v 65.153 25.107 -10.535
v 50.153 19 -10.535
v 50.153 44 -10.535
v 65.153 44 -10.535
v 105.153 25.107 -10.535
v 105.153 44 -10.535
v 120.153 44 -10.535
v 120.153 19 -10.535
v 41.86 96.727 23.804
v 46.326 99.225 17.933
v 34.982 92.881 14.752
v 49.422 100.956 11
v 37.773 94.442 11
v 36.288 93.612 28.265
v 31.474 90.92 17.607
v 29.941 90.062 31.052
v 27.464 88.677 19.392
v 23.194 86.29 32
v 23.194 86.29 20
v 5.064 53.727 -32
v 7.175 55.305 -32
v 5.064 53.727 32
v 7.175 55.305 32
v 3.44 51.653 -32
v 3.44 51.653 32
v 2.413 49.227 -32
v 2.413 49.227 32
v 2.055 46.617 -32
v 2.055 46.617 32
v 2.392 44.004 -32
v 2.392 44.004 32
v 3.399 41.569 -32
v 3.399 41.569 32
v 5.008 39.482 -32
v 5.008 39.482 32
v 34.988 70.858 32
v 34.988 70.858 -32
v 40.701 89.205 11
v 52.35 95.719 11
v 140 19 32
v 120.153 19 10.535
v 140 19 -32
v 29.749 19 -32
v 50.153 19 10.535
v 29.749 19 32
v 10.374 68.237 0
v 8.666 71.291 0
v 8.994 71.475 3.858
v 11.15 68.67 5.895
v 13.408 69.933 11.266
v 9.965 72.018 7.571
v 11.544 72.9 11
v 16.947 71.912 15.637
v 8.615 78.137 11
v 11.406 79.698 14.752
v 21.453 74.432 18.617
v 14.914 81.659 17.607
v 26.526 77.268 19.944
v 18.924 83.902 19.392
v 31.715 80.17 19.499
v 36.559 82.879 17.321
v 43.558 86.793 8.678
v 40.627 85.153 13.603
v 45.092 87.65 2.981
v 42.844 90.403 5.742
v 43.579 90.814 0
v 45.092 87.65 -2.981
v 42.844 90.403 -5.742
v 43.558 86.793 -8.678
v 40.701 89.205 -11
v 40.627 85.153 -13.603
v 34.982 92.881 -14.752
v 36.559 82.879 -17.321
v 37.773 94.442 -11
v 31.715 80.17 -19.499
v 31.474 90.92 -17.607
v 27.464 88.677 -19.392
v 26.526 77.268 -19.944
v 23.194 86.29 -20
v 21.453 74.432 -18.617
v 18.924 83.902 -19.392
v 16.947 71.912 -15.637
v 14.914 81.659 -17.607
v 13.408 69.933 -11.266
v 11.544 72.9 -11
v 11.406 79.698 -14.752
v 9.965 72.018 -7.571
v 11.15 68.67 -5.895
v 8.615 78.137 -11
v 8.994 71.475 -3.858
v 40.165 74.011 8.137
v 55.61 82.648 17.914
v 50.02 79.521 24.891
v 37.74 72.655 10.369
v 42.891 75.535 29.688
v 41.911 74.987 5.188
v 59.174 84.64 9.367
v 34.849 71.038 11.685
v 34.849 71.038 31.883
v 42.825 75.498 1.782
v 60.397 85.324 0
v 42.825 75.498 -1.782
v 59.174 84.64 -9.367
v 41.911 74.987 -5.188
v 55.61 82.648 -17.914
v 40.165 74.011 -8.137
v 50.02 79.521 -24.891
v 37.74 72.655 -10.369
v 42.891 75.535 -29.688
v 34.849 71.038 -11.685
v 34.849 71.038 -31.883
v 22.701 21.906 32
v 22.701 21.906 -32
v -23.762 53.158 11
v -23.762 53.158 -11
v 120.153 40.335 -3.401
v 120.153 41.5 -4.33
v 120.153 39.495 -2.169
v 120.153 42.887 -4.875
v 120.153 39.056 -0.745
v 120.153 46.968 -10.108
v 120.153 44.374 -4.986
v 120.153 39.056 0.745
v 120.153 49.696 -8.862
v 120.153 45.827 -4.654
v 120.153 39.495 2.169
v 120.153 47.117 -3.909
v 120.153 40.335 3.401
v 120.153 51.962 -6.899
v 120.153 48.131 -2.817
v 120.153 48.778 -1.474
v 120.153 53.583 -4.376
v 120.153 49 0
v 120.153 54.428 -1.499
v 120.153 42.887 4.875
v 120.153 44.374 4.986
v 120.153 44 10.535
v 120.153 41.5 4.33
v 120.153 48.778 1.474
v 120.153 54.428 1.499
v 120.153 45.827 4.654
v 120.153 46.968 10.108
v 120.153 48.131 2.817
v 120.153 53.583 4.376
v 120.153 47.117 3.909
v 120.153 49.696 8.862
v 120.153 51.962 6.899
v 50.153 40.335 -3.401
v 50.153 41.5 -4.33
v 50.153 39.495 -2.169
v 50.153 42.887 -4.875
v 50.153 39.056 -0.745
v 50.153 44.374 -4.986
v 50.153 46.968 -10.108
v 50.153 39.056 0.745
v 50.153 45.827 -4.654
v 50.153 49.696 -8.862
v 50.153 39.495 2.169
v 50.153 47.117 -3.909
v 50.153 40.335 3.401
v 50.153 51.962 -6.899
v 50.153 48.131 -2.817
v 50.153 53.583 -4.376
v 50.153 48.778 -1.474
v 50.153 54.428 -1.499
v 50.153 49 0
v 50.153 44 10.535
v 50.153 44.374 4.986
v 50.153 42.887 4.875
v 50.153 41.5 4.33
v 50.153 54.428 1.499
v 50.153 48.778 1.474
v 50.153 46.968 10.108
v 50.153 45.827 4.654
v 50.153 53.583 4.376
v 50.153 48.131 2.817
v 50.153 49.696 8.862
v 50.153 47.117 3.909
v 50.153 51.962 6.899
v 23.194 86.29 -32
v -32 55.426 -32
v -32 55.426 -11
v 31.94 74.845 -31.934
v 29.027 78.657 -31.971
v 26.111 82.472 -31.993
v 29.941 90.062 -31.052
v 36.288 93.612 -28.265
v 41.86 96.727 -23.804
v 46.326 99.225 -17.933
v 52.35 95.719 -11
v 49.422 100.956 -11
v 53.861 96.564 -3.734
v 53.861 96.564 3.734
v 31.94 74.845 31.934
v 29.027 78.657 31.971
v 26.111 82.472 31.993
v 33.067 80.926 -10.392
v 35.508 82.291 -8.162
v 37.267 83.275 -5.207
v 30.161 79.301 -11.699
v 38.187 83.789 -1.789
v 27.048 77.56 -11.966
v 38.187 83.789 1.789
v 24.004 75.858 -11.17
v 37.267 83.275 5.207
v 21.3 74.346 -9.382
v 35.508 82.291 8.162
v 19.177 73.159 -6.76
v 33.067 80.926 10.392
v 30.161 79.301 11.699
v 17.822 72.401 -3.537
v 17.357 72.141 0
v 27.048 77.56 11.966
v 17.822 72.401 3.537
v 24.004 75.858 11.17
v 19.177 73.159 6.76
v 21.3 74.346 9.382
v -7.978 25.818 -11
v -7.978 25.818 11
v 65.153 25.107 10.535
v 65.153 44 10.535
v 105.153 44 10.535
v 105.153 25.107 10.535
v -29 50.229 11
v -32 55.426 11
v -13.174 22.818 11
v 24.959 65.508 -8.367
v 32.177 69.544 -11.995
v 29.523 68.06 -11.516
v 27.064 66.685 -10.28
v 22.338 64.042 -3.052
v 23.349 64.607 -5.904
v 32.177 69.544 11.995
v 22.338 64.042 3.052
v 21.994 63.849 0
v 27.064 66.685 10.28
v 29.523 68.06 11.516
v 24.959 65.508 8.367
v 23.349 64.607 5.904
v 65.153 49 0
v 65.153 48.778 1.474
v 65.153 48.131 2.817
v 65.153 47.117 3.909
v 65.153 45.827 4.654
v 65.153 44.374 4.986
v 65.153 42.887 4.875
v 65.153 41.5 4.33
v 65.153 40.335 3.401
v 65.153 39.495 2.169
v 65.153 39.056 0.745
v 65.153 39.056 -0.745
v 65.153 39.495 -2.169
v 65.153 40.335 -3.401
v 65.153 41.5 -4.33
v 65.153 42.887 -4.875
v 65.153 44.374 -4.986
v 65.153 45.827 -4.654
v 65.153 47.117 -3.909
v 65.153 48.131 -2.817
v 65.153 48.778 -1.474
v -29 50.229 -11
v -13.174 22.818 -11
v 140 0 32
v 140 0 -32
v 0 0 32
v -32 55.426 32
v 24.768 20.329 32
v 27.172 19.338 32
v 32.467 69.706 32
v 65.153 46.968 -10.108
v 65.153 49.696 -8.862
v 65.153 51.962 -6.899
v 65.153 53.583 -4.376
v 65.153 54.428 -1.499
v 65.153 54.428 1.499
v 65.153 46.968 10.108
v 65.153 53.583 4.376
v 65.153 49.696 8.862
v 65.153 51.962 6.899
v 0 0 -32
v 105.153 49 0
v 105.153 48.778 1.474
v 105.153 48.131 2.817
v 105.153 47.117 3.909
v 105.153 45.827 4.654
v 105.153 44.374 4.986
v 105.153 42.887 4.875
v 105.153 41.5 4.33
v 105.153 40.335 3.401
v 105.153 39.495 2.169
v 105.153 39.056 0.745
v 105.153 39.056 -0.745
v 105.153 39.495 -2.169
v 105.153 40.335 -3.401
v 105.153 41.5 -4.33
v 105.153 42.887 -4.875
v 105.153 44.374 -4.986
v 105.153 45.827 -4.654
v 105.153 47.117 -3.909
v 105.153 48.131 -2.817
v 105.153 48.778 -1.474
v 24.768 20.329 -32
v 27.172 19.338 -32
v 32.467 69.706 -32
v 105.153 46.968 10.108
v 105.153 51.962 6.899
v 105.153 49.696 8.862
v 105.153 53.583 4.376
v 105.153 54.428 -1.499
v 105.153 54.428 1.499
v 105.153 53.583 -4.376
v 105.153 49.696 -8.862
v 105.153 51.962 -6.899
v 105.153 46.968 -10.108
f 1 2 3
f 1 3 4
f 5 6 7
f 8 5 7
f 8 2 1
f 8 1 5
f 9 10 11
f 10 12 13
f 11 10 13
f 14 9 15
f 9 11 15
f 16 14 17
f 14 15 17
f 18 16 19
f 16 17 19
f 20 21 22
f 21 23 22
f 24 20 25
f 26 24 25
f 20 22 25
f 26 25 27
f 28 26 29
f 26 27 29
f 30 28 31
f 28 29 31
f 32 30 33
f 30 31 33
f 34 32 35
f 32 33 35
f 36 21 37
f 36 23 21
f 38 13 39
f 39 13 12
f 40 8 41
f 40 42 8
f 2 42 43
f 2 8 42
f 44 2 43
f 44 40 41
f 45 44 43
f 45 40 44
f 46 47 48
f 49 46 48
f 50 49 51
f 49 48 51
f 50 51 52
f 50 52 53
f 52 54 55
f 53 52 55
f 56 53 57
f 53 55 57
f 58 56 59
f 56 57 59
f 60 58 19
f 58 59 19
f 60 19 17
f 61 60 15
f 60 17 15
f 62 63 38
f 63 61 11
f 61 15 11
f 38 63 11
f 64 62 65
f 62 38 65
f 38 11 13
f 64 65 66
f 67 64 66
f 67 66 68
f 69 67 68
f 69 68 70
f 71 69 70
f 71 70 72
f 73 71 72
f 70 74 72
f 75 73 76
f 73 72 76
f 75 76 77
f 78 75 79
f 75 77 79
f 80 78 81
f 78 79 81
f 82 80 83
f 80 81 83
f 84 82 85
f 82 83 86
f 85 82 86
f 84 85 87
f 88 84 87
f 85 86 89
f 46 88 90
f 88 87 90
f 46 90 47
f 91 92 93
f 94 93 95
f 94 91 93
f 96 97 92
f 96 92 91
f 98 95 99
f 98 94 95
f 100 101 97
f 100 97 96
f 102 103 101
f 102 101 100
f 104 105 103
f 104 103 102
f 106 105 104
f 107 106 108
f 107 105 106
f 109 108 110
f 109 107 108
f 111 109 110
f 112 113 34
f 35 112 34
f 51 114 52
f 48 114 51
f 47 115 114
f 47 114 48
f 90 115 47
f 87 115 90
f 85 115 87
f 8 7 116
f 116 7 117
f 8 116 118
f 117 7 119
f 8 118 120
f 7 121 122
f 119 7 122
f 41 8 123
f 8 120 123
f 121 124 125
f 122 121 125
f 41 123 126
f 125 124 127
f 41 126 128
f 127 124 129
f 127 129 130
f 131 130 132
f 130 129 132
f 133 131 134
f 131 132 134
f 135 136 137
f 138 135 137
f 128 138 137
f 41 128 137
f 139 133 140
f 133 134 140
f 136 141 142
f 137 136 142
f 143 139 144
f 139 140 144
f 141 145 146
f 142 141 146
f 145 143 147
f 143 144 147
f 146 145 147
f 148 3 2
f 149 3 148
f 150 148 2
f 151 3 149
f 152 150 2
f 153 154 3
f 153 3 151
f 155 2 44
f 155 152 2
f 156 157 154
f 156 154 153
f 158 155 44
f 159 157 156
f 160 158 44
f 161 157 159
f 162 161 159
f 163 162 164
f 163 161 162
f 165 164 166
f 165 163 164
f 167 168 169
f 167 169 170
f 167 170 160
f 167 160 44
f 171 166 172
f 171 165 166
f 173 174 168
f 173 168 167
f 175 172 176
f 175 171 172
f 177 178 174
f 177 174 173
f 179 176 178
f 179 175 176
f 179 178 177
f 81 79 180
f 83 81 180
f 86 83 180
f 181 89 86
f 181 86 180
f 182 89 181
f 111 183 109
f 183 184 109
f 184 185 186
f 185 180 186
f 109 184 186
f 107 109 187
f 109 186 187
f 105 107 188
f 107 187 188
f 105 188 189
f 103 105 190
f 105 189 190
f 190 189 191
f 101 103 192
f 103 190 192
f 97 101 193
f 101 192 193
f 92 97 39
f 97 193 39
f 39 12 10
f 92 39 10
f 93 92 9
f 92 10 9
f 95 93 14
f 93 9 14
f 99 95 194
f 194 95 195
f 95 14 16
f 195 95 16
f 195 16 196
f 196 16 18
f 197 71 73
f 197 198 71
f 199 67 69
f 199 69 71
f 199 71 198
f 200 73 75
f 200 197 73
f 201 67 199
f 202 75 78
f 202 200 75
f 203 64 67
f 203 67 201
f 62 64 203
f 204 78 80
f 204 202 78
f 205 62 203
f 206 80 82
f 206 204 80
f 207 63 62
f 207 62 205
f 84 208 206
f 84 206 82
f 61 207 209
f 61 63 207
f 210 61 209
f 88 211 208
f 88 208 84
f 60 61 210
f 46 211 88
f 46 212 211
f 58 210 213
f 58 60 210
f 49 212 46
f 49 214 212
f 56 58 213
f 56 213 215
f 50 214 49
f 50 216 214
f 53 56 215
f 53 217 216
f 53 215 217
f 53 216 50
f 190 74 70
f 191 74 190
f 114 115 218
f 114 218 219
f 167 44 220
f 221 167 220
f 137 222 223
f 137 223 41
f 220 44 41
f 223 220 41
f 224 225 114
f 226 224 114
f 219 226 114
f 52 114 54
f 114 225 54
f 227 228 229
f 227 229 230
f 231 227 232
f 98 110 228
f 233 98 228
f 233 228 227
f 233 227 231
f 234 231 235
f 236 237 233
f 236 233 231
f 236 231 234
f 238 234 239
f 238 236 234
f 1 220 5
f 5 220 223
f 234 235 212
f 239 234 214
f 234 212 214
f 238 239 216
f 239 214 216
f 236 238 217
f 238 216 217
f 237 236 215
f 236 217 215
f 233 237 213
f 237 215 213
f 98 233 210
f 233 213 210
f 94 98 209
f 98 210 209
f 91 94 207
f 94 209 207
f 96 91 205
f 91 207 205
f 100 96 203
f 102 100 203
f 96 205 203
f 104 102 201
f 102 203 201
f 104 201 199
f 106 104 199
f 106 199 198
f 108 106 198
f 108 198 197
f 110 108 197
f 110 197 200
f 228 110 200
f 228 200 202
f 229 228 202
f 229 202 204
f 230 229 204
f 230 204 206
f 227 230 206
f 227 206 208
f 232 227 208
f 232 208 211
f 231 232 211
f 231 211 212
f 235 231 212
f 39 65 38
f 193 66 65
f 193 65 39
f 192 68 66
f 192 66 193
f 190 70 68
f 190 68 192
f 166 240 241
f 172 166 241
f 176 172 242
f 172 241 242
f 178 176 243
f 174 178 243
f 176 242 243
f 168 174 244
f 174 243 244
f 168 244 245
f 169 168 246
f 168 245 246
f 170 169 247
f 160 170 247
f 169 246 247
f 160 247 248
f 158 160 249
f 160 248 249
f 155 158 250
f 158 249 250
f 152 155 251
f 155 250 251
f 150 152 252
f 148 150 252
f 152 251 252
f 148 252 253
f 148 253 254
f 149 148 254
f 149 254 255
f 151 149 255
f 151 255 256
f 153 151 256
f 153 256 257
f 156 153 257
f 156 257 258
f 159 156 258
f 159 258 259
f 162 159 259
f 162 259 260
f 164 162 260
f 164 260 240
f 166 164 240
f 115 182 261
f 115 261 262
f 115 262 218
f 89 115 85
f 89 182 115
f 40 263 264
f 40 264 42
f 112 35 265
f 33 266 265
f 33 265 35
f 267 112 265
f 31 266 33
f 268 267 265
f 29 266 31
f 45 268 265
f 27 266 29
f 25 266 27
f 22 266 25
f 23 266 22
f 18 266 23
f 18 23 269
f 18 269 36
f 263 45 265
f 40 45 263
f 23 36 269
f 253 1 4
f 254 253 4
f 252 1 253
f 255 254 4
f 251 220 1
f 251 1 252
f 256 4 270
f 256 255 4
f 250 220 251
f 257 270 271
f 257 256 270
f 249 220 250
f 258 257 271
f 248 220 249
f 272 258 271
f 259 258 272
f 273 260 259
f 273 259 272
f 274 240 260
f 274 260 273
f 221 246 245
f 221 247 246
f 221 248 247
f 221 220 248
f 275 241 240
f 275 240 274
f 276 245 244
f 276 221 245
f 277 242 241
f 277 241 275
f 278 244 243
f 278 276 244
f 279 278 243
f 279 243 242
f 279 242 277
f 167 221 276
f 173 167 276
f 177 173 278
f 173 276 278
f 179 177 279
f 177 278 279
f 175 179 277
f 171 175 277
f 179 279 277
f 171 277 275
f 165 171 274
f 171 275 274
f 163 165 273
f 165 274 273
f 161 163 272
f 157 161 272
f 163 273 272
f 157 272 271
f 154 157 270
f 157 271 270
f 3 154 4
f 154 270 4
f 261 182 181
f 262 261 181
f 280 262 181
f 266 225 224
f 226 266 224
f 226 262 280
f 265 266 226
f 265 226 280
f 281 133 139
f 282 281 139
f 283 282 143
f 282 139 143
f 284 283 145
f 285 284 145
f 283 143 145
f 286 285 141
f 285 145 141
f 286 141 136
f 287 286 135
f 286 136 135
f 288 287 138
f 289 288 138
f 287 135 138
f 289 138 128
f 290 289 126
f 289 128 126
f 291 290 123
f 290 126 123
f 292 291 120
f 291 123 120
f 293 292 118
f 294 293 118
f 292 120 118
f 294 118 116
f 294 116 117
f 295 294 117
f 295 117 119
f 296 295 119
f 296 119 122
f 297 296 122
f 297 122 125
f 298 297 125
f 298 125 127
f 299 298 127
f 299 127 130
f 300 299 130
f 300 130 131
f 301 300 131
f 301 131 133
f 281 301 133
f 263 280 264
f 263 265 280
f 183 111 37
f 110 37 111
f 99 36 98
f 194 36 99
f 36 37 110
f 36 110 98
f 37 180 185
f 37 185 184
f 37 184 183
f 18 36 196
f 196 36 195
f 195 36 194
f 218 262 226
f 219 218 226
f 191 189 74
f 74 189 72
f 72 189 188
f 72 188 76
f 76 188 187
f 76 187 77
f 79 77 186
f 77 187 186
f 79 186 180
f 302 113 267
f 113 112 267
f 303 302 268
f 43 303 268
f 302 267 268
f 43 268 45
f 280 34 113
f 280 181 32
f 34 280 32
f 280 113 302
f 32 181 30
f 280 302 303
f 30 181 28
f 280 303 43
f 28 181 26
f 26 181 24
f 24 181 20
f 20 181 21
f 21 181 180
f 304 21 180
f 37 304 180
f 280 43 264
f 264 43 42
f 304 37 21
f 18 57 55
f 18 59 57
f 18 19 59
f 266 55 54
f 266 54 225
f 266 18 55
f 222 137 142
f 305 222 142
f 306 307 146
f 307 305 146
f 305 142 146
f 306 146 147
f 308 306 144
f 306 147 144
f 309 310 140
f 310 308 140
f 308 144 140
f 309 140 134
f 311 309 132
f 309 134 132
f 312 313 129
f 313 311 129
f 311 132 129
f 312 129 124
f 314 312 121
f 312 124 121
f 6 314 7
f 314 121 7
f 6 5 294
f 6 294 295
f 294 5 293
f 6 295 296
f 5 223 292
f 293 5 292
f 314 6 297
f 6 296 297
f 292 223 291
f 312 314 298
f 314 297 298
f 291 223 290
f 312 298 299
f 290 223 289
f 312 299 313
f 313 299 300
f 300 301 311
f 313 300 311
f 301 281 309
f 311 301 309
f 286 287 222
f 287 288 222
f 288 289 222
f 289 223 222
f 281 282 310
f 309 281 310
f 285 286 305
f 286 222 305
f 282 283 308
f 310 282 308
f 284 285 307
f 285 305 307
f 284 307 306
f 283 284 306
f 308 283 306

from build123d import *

# Parameters (mm, degrees)
BOSS_EXTRUDE1_DEPTH = 32
FILLET1_R           = 10
FILLET2_R           = 10
BOSS_EXTRUDE2_DEPTH = 19
SKETCH3_R           = 12
CUT_EXTRUDE1_DEPTH  = 19
SKETCH4_R           = 20
CUT_EXTRUDE2_DEPTH  = 9.5
SKETCH5_W           = 146.165275263
SKETCH5_H           = 22
CUT_EXTRUDE3_DEPTH  = 6
SKETCH6_W           = 22
SKETCH6_H           = 63.302471394
CUT_EXTRUDE4_DEPTH  = 6
SKETCH7_W           = 70
SKETCH7_H           = 21.06948543
BOSS_EXTRUDE3_DEPTH = 25
BOSS_EXTRUDE4_DEPTH = 70
SKETCH9_R           = 5
CUT_EXTRUDE5_DEPTH  = 70
SKETCH10_W          = 40
SKETCH10_H          = 90
CUT_EXTRUDE6_DEPTH  = 70


with BuildPart() as part:
    # Sketch1 → Boss-Extrude1 (new, symmetric)
    with BuildSketch(Plane.XY):
        Polygon((0, 0), (140, 0), (140, 19), (25.626336332, 19), (-4.402994998, 48.830779291), (34.987574414, 70.857602718), (23.194010005, 86.289579595), (-32, 55.425625842), align=None)
    extrude(amount=BOSS_EXTRUDE1_DEPTH, both=True)

    # Fillet1
    fillet1_edges = [part.edges().sort_by_distance(p)[0] for p in [
        (-4.402994998, 48.830779291, 0),
    ]]
    fillet(fillet1_edges, radius=FILLET1_R)

    # Fillet2
    fillet2_edges = [part.edges().sort_by_distance(p)[0] for p in [
        (25.626336332, 19, 0),
    ]]
    fillet(fillet2_edges, radius=FILLET2_R)

    # Sketch2 → Boss-Extrude2 (add)
    with BuildSketch(Plane(origin=(-31.233234019, 55.854393924, 0), x_dir=(0.8728071364976854, 0.4880652645689006, 0), z_dir=(-0.48806526456890054, 0.8728071364976853, 0))):
        with BuildLine():
            ThreePointArc((62.358843951, 32), (94.358843951, 0), (62.358843951, -32))
            Line((62.358843951, -32), (62.358843951, 32))
        make_face()
    extrude(amount=-BOSS_EXTRUDE2_DEPTH)

    # Sketch3 → Cut-Extrude1 (cut)
    with BuildSketch(Plane(origin=(-31.233234019, 55.854393924, 0), x_dir=(0.8728071364976854, 0.4880652645689006, 0), z_dir=(-0.48806526456890054, 0.8728071364976853, 0))):
        with Locations(Location((62.358843951, 0, 0), (0, 0, 180))):
            Circle(SKETCH3_R)
    extrude(amount=-CUT_EXTRUDE1_DEPTH, mode=Mode.SUBTRACT)

    # Sketch4 → Cut-Extrude2 (cut)
    with BuildSketch(Plane(origin=(-31.233234019, 55.854393924, 0), x_dir=(0.8728071364976854, 0.4880652645689006, 0), z_dir=(-0.48806526456890054, 0.8728071364976853, 0))):
        with Locations(Location((62.358843951, 0, 0), (0, 0, 180))):
            Circle(SKETCH4_R)
    extrude(amount=-CUT_EXTRUDE2_DEPTH, mode=Mode.SUBTRACT)

    # Sketch5 → Cut-Extrude3 (cut)
    with BuildSketch(Plane(origin=(-31.233234019, 55.854393924, 0), x_dir=(0.8728071364976854, 0.4880652645689006, 0), z_dir=(-0.48806526456890054, 0.8728071364976853, 0))):
        with Locations((62.35884395, 0)):
            Rectangle(SKETCH5_W, SKETCH5_H)
    extrude(amount=-CUT_EXTRUDE3_DEPTH, mode=Mode.SUBTRACT)

    # Sketch6 → Cut-Extrude4 (cut)
    with BuildSketch(Plane(origin=(0, 0, 0), x_dir=(0, 0, 1), z_dir=(-0.8660254037844362, -0.5000000000000046, 0))):
        with Locations((0, 57.999434657)):
            Rectangle(SKETCH6_W, SKETCH6_H)
    extrude(amount=-CUT_EXTRUDE4_DEPTH, mode=Mode.SUBTRACT)

    # Sketch7 → Boss-Extrude3 (add)
    with BuildSketch(Plane(origin=(0, 19, 0), x_dir=(1, 0, 0), z_dir=(0, 1, 0))):
        with Locations((85.152528748, 0)):
            Rectangle(SKETCH7_W, SKETCH7_H)
    extrude(amount=BOSS_EXTRUDE3_DEPTH)

    # Sketch8 → Boss-Extrude4 (add)
    with BuildSketch(Plane(origin=(120.152528748, 0, 0), x_dir=(0, 0, -1), z_dir=(1, 0, 0))):
        with BuildLine():
            ThreePointArc((-10.534742715, 44), (0, 54.534742715), (10.534742715, 44))
            Line((10.534742715, 44), (-10.534742715, 44))
        make_face()
    extrude(amount=-BOSS_EXTRUDE4_DEPTH)

    # Sketch9 → Cut-Extrude5 (cut)
    with BuildSketch(Plane(origin=(120.152528748, 0, 0), x_dir=(0, 0, -1), z_dir=(1, 0, 0))):
        with Locations(Location((0, 44, 0), (0, 0, 90))):
            Circle(SKETCH9_R)
    extrude(amount=-CUT_EXTRUDE5_DEPTH, mode=Mode.SUBTRACT)

    # Sketch10 → Cut-Extrude6 (cut)
    with BuildSketch(Plane.XY.offset(10.534742715)):
        with Locations((85.152528748, 70.106665045)):
            Rectangle(SKETCH10_W, SKETCH10_H)
    extrude(amount=-CUT_EXTRUDE6_DEPTH, mode=Mode.SUBTRACT)


solid = part.part
